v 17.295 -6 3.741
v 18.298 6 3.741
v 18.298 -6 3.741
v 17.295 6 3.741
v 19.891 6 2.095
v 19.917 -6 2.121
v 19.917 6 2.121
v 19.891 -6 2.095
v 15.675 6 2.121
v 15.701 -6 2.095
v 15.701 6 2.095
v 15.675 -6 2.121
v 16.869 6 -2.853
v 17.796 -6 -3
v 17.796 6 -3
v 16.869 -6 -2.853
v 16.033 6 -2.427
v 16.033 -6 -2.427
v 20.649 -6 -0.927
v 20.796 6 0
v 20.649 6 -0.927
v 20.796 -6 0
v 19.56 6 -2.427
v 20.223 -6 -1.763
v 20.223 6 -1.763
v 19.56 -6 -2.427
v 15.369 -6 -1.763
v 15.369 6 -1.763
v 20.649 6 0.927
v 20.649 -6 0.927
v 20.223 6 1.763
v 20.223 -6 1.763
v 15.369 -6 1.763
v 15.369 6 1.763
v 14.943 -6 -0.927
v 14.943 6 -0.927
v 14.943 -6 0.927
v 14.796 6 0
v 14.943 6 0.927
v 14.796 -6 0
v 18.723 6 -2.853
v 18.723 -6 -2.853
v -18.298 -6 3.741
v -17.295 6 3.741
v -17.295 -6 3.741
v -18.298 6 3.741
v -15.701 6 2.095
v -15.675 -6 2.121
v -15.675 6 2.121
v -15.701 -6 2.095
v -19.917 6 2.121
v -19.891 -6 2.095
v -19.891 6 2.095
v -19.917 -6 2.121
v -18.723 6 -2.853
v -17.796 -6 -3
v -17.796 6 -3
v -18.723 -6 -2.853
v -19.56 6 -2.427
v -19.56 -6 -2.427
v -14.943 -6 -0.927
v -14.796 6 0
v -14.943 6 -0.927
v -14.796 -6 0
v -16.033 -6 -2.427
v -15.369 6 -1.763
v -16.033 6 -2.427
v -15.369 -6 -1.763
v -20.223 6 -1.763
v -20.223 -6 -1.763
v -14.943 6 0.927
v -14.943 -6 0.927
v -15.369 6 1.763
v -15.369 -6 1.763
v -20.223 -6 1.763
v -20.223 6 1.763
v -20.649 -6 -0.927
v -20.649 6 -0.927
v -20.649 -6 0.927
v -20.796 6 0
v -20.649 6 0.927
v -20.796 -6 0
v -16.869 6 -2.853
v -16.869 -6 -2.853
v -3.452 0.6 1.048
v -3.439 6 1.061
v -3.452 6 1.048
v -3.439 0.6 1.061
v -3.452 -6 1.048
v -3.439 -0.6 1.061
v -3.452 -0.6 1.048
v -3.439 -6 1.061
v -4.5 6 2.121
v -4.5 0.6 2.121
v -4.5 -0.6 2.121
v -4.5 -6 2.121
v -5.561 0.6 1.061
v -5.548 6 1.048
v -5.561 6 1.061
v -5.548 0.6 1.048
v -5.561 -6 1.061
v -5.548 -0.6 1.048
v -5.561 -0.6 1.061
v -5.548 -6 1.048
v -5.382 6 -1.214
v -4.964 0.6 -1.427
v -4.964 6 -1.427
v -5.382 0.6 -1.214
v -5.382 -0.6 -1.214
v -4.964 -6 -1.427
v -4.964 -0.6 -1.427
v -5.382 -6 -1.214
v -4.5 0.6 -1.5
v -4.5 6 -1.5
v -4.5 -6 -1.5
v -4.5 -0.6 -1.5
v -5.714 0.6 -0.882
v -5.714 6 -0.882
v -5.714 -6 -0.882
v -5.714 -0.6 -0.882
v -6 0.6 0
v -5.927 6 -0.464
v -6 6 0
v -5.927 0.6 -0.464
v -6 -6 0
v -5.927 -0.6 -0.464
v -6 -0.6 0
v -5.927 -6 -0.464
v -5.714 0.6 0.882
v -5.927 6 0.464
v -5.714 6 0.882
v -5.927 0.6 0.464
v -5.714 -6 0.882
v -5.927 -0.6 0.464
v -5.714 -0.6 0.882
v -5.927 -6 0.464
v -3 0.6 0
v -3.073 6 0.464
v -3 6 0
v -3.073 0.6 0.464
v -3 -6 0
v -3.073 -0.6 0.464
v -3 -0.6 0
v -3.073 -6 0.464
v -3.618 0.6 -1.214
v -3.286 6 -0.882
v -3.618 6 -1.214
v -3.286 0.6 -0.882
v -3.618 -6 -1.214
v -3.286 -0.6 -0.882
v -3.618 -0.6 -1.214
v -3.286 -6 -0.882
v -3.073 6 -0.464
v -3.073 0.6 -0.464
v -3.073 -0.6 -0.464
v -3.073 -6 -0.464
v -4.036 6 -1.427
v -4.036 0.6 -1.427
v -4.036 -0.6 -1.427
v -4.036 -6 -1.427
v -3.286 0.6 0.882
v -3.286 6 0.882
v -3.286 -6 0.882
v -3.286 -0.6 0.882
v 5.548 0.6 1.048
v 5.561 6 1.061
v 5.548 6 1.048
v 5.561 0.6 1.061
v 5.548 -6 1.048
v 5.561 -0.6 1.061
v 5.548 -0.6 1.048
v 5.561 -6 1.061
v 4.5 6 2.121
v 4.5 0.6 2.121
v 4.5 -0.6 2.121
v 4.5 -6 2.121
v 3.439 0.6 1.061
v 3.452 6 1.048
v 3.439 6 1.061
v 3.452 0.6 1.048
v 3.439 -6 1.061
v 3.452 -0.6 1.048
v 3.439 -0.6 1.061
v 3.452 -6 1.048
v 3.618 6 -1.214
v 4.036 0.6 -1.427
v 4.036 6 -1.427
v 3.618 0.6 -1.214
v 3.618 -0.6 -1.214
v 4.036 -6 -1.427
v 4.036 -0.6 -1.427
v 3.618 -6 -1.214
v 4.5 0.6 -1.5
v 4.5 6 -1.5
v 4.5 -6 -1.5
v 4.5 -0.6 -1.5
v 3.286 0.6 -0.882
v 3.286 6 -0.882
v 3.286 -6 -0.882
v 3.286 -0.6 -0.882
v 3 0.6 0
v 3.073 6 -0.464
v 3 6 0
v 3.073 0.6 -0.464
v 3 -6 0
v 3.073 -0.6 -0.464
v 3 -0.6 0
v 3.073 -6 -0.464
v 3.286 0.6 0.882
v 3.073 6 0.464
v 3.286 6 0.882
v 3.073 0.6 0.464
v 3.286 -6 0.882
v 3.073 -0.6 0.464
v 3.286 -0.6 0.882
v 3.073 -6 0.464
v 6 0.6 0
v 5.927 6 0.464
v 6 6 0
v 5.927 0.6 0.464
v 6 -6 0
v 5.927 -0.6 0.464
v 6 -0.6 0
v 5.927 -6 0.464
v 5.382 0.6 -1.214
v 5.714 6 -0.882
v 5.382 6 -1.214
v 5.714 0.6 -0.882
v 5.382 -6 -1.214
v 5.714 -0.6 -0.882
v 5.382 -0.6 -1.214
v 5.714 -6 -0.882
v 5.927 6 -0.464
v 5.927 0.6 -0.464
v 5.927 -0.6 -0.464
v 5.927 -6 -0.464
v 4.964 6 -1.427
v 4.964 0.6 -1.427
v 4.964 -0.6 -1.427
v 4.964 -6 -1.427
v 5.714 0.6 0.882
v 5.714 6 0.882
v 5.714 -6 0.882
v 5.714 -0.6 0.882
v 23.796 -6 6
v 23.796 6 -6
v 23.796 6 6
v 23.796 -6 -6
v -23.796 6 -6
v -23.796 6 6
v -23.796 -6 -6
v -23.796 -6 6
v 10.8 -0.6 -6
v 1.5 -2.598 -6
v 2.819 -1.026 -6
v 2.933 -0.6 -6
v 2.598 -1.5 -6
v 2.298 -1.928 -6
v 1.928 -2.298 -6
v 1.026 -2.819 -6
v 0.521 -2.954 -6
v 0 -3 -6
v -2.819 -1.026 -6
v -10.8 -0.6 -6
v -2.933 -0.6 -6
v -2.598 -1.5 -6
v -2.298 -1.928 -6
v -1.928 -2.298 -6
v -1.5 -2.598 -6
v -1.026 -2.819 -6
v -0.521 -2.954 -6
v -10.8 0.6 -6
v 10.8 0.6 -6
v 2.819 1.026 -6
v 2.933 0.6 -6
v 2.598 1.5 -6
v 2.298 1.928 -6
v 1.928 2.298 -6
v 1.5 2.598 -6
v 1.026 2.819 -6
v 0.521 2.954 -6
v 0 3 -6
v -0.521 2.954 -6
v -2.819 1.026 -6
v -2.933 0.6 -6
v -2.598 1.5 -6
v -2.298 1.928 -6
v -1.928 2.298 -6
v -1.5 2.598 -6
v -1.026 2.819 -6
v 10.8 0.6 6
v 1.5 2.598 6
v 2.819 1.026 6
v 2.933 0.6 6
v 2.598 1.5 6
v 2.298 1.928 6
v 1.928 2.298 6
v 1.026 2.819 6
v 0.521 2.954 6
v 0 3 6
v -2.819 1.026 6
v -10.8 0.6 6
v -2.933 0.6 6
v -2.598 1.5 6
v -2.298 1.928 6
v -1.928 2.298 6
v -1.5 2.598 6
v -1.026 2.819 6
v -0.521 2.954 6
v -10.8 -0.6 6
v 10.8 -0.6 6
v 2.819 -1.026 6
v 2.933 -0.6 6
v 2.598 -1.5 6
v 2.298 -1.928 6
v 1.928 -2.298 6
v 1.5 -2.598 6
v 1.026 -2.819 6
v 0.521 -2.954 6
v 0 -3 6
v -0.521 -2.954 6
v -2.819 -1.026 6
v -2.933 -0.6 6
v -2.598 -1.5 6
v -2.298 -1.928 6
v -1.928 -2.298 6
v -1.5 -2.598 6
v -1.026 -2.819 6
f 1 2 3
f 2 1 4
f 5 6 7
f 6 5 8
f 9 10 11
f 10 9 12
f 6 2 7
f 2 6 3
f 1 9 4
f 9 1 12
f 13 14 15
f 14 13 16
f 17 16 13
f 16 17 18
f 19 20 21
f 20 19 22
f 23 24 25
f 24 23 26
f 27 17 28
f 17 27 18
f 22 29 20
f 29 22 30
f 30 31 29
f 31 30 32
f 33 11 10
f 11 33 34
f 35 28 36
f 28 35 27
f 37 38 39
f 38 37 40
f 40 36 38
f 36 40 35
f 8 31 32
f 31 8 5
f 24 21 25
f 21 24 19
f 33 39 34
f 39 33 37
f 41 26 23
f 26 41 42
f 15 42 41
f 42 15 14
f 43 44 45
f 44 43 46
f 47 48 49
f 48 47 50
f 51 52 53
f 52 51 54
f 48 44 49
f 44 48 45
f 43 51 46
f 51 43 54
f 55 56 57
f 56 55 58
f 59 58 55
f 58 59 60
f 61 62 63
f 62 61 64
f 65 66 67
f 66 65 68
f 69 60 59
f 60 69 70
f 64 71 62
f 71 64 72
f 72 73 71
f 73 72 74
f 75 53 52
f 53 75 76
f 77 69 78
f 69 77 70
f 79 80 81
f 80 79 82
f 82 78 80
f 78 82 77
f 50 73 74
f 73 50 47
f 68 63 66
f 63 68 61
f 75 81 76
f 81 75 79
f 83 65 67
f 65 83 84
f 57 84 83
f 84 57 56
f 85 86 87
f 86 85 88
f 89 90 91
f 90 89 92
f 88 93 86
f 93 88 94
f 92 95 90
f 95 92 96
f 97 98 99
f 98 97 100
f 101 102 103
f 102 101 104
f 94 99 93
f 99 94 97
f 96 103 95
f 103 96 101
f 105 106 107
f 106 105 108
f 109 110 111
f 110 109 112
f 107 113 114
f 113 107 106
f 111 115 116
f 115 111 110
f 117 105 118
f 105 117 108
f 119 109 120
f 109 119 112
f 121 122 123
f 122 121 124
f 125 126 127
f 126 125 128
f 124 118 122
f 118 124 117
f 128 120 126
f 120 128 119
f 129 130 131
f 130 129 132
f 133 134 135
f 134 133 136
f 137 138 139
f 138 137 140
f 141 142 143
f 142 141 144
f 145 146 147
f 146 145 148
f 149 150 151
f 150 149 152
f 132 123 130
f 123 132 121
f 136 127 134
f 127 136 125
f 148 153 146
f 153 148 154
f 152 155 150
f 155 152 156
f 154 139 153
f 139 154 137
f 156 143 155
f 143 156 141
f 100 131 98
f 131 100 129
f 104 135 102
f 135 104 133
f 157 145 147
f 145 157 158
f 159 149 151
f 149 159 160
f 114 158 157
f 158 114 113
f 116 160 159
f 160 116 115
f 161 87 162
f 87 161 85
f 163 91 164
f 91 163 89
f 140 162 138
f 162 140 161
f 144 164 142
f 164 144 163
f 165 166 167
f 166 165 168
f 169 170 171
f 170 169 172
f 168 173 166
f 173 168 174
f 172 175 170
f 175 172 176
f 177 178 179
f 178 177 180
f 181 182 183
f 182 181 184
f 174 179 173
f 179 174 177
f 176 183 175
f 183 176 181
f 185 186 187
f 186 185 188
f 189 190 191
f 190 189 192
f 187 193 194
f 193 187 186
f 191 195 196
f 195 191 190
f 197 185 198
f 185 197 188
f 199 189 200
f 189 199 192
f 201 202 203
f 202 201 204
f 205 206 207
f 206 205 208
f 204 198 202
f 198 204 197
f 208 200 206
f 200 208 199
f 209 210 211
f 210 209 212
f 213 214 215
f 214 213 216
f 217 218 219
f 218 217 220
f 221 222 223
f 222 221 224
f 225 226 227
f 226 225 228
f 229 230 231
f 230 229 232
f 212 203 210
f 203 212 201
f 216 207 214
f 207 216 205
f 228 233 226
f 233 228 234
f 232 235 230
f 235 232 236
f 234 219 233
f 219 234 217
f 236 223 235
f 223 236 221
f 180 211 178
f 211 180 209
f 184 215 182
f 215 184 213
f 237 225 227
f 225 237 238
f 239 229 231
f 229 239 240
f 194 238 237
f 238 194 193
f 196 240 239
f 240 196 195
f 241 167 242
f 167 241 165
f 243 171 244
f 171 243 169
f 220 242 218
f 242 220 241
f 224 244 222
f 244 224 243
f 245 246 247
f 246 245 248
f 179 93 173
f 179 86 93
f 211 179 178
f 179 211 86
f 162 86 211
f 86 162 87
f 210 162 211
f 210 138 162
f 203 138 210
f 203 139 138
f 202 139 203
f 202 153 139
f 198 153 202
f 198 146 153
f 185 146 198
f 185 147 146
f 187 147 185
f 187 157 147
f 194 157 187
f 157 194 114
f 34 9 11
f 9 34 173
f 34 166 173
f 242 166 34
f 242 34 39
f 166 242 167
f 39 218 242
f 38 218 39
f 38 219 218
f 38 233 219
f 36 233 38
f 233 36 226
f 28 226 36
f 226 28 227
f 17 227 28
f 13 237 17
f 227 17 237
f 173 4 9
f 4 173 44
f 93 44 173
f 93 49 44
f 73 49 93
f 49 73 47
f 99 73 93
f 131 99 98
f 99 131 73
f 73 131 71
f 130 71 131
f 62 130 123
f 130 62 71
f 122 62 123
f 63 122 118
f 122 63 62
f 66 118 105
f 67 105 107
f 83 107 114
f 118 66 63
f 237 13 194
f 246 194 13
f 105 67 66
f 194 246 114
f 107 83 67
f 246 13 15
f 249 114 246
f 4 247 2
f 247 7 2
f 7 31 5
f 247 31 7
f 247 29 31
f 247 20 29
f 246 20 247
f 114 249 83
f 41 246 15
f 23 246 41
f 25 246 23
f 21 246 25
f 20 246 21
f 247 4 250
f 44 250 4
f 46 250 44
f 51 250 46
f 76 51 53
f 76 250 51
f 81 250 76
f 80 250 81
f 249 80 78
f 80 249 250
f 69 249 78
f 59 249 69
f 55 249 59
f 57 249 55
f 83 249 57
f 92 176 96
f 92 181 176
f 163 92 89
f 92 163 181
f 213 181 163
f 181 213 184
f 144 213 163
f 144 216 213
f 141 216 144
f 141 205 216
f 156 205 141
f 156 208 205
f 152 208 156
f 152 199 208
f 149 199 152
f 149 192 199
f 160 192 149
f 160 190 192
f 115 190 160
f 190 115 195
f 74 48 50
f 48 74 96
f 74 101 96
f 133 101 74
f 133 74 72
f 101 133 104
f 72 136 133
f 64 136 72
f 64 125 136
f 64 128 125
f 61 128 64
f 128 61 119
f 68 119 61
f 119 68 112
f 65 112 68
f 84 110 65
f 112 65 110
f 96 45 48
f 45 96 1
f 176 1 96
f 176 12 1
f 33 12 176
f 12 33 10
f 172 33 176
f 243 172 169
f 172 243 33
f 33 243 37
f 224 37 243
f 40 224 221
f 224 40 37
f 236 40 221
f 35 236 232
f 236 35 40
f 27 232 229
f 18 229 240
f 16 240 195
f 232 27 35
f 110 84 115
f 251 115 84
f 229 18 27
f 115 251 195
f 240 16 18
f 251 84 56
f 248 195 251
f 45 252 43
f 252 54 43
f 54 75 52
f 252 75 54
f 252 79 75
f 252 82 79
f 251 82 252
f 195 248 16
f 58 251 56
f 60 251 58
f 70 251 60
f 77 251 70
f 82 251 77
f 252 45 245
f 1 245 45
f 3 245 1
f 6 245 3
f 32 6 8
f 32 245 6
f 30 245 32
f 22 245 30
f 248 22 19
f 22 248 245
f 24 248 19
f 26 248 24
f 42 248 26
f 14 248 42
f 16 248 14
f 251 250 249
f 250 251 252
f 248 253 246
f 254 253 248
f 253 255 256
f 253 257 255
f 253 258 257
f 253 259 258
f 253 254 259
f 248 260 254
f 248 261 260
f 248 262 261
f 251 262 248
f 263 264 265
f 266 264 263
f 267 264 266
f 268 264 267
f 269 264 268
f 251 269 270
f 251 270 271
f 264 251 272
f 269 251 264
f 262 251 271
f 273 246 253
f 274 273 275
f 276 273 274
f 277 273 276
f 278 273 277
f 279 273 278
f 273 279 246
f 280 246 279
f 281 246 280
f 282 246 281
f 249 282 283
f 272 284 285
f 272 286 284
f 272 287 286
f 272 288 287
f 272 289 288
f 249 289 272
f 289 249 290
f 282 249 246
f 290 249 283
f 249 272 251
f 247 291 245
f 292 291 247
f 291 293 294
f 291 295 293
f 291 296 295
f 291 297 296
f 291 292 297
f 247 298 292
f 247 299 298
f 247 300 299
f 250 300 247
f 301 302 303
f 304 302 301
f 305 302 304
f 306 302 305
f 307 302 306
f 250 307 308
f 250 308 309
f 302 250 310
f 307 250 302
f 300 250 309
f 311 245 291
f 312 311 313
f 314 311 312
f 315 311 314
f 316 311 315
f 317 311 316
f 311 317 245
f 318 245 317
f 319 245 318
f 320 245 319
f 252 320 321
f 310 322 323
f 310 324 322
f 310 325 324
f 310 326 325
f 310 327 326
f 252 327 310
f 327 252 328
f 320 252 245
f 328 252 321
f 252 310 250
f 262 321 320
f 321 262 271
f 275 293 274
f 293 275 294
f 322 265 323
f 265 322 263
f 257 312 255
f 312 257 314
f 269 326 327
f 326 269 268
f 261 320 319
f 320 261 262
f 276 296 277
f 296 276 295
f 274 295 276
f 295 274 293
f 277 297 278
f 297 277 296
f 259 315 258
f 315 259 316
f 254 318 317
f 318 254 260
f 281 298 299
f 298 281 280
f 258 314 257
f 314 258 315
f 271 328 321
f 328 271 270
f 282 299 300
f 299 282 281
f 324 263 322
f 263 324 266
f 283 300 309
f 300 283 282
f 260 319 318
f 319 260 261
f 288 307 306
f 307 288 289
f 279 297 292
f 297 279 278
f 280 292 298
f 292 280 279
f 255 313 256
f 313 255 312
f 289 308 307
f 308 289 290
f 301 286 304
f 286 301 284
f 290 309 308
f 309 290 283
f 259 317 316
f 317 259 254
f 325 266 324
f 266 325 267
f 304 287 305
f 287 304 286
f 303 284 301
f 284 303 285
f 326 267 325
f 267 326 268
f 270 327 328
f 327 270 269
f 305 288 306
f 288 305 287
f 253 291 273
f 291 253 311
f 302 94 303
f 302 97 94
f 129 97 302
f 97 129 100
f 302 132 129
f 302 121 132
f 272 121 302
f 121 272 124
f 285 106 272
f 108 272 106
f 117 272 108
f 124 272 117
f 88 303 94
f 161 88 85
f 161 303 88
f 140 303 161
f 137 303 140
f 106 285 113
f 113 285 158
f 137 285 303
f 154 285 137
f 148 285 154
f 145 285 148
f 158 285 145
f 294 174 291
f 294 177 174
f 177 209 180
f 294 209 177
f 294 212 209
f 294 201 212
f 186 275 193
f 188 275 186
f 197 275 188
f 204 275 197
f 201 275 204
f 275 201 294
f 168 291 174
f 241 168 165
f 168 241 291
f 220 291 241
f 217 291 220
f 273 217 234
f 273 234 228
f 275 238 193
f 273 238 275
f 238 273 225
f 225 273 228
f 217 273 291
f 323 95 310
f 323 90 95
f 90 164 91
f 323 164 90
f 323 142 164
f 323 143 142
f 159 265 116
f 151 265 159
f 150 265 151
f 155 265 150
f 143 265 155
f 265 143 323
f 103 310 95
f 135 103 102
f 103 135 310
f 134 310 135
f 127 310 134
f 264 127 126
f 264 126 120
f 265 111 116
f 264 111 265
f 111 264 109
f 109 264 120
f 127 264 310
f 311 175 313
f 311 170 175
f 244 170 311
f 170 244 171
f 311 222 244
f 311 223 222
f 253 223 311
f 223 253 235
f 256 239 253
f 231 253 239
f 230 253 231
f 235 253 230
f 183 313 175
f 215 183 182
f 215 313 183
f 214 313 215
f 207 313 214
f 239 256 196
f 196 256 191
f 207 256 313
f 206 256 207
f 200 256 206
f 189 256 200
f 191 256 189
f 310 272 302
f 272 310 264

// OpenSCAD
// file: library.scad
include <parameters.scad>;


// inner and outer product.  Why aren't these standard?!!!?

function ip(v1 = [0,0,0], v2 = [0,0,0]) = v1.x*v2.x + v1.y*v2.y + v1.z*v2.z;

function op(v1 = [0,0,0], v2 = [0,0,0]) = [v1.y*v2.z - v1.z*v2.y, v1.z*v2.x - v1.x*v2.z, v1.x*v2.y - v1.y*v2.x];


/*
  This gives either a NEMA 14 stepper motor or its mounting holes.

  If body is true, you get the motor.  If it is false you get the screw holes and central
  hole needed to mount the motor.  If counterbore is positive and you are generating the mounting holes
  then the screw holes will get fat to accomodate a cap-screw head counterbore mm away from the face 
  of the motor.  For no counterbores, set counterbore negative.

*/

module nema14(body = true, counterbore = -1)
{
	color([1,0.4,0.4,1])
	union()
	{
		if(body)
		{
			translate([0, 0, nema14_shaft_length/2 - nema14_shaft_projection - nema14_hub_depth])
				cylinder(r = nema14_shaft/2, h = nema14_shaft_length, center = true, $fn=20);
			translate([0, 0, -nema14_hub_depth])
				cylinder(r = nema14_hub/2, h = nema14_hub_depth*2, center = true, $fn=20);
	
			translate([0, 0, nema14_length/2])
				cube([nema14_square,nema14_square,nema14_length], center = true);
		} else
			translate([0, 0, -20])
				cylinder(r = nema14_hub/2 + 1, h = 50, center = true, $fn=20);

		if(!body)
		{
			union()
			{
				for ( x = [0:1] ) 
				for ( y = [0:1] )
				{
					translate([(x-0.5)*nema14_screws, (y-0.5)*nema14_screws, -20])
						cylinder(r = screwsize/2, h = 50, center = true, $fn=10);
					if(counterbore >= 0)
						translate([(x-0.5)*nema14_screws, (y-0.5)*nema14_screws, -25-counterbore])
							cylinder(r = screwsize, h = 50, center = true, $fn=10);
				}
			}
		}
	}


}


// Pentagon nut that matches a hexagon...

module pentanut(height=40)
{
	rotate([0,0,60])
	intersection()
	{
		translate([-nutsize,-nutsize*5,-20])
			cube([nutsize*10, nutsize*10,height]);
		rotate([0,0,60])
			translate([-nutsize,-nutsize*5,-20])
				cube([nutsize*10, nutsize*10,height]);
		rotate([0,0,120])
			translate([-nutsize,-nutsize*5,-20])
				cube([nutsize*10, nutsize*10,height]);
		rotate([0,0,180])
			translate([-nutsize,-nutsize*5,-20])
				cube([nutsize*10, nutsize*10,height]);
		rotate([0,0,240])
			translate([-nutsize,-nutsize*5,-20])
				cube([nutsize*10, nutsize*10,height]);
	}
}


// Make a RepRap teardrop with its axis along Z
// If truncated is true, chop the apex; if not, come to a point

// I stole this function from Erik...


module teardrop(r=1.5, h=20, truncateMM=0.5)
{
	union()
	{
		if(truncateMM > 0)
		{
			intersection()
			{
				translate([truncateMM,0,h/2]) 
					scale([1,1,h])
						cube([r*2.8275,r*2,1],center=true);
				scale([1,1,h]) 
						rotate([0,0,3*45])
							cube([r,r,1]);
			}
		} else
		{
			scale([1,1,h])
				rotate([0,0,3*45])
					cube([r,r,1]);
		}
		cylinder(r=r, h = h, $fn=20);
	}
}


// Make a ball-bearing holder cutout

module bearing_holder(radius = 6.5)
{
	union()
	{
		cylinder (h = radius*20, r = radius, center = true, $fn = 20);
		for(i=[0:2])
		{
			rotate([0,0,120*i])
				translate([radius+screwsize/2, 0, 0])
					union()
					{
						cylinder (h = radius*20, r = screwsize/2, center = true, $fn = 20);
						translate([-screwsize, 0, 0])
							cube([2*screwsize, screwsize, radius*20], center = true);
					}
		}
	}
}

// Make a cuboid with a 45 degree top for vertical slots etc

module cen_hat(size)
{
	translate([0, 0, size.x/sqrt(2)])
		union()
		{
			rotate([0, 45, 0])
				cube([size.x, size.y, 5*max(size.x, max(size.y, size.z))], center=true);
			rotate([0, -45, 0])
				cube([size.x, size.y, 5*max(size.x, max(size.y, size.z))], center=true);
		}
}

module hat_cube(size = [1,1,1], center = false)
{
	difference()
	{
		cube(size, center);
		if(center)
			translate([0, 0, size.z/2])
				cen_hat(size);
		else
			translate([size.x/2, size.y/2, size.z])
				cen_hat(size);
	}
}



module rod(length, threaded) if (threaded && renderrodthreads) {
	linear_extrude(height = length, center = true, convexity = 10, twist = -360 * length / rodpitch, $fn = fn)
		translate([rodsize * 0.1 / 2, 0, 0])
			circle(r = rodsize * 0.9 / 2, $fn = fn);
} else cylinder(h = length, r = rodsize / 2, center = true, $fn = fn);


module rodnut(position, washer) render() translate([0, 0, position]) {
	intersection() {
		scale([1, 1, 0.5]) sphere(r = 1.05 * rodsize, center = true);
		difference() {
			cylinder (h = rodnutsize, r = rodnutdiameter / 2, center = true, $fn = 6);
			rod(rodnutsize + 0.1);
		}
	}
	if (washer == 1 || washer == 4) rodwasher(((position > 0) ? -1 : 1) * (rodnutsize + rodwashersize) / 2);
	if (washer == 2 || washer == 4) rodwasher(((position > 0) ? 1 : -1) * (rodnutsize + rodwashersize) / 2);
}


module rodwasher(position) render() translate ([0, 0, position]) difference() {
	cylinder(r = rodwasherdiameter / 2, h = rodwashersize, center = true, $fn = fn);
	rod(rodwashersize + 0.1);
}


module screw(length, nutpos, washer, bearingpos = -1) union(){
	translate([0, 0, -length / 2]) if (renderscrewthreads) {
		linear_extrude(height = length, center = true, convexity = 10, twist = -360 * length / screwpitch, $fn = fn)
			translate([screwsize * 0.1 / 2, 0, 0])
				circle(r = screwsize * 0.9 / 2, $fn = fn);
	} else cylinder(h = length, r = screwsize / 2, center = true, $fn = fn);
	render() difference() {
		translate([0, 0, screwsize / 2]) cylinder(h = screwsize, r = screwsize, center = true, $fn = fn);
		translate([0, 0, screwsize]) cylinder(h = screwsize, r = screwsize / 2, center = true, $fn = 6);
	}
	if (washer > 0 && nutpos > 0) {
		washer(nutpos);
		nut(nutpos + washersize);
	} else if (nutpos > 0) nut(nutpos);
	if (bearingpos >= 0) bearing(bearingpos);
}


module bearing(position) render() translate([0, 0, -position - bearingwidth / 2]) union() {
	difference() {
		cylinder(h = bearingwidth, r = bearingsize / 2, center = true, $fn = fn);
		cylinder(h = bearingwidth * 2, r = bearingsize / 2 - 1, center = true, $fn = fn);
	}
	difference() {
		cylinder(h = bearingwidth - 0.5, r = bearingsize / 2 - 0.5, center = true, $fn = fn);
		cylinder(h = bearingwidth * 2, r = screwsize / 2 + 0.5, center = true, $fn = fn);
	}
	difference() {
		cylinder(h = bearingwidth, r = screwsize / 2 + 1, center = true, $fn = fn);
		cylinder(h = bearingwidth + 0.1, r = screwsize / 2, center = true, $fn = fn);
	}
}


module nut(position, washer) render() translate([0, 0, -position - nutsize / 2]) {
	intersection() {
		scale([1, 1, 0.5]) sphere(r = 1.05 * screwsize, center = true);
		difference() {
			cylinder (h = nutsize, r = nutdiameter / 2, center = true, $fn = 6);
			cylinder(r = screwsize / 2, h = nutsize + 0.1, center = true, $fn = fn);
		}
	}
	if (washer > 0) washer(0);
}


module washer(position) render() translate ([0, 0, -position - washersize / 2]) difference() {
	cylinder(r = washerdiameter / 2, h = washersize, center = true, $fn = fn);
	cylinder(r = screwsize / 2, h = washersize + 0.1, center = true, $fn = fn);
}


//rod(20);
//translate([rodsize * 2.5, 0, 0]) rod(20, true);
//translate([rodsize * 5, 0, 0]) screw(10, true);
//translate([rodsize * 7.5, 0, 0]) bearing();
//translate([rodsize * 10, 0, 0]) rodnut();
//translate([rodsize * 12.5, 0, 0]) rodwasher();
//translate([rodsize * 15, 0, 0]) nut();
//translate([rodsize * 17.5, 0, 0]) washer();

//hat_cube(size=[2,40,2], center=false);

//bearing_holder();

//teardrop();

//pentanut();

//nema14(body = true, counterbore = -1);
// file: parameters.scad
// Parameters file for RepRap Huxley

pi=3.14159265;

// The relative location in your file system where the .dxf files are
// DXFs are for quick development.  They should be replaced by parameterised CSG in dure course.

fileroot="DXF-files/";

rodsize = 6;	//threaded/smooth rod diameter in mm
xaxis = 182.5;	//width of base in mm
yaxis = 266.5;	//length of base in mm


screwsize = 3;	//bearing bore/screw diameter in mm
bearingsize = 10;	//outer diameter of bearings in mm
bearingwidth = 4;	//width of bearings in mm


rodpitch = rodsize / 6;
rodnutsize = 0.8 * rodsize;
rodnutdiameter = 1.9 * rodsize;
rodwashersize = 0.2 * rodsize;
rodwasherdiameter = 2 * rodsize;
screwpitch = screwsize / 6;
nutsize = 0.8 * screwsize;
nutdiameter = 1.9 * screwsize;
washersize = 0.2 * screwsize;
washerdiameter = 2 * screwsize;
partthick = 2 * rodsize;
vertexrodspace = 2 * rodsize;


c = [0.3, 0.3, 0.3];
rodendoffset = rodnutsize + rodwashersize * 2 + partthick / 2;
vertexoffset = vertexrodspace + rodendoffset;


renderrodthreads = false;
renderscrewthreads = false;
fn = 36;

// The gap between the joining rods at a vertex

vertex_radius=sqrt(rodsize*rodsize + vertexoffset*vertexoffset);
vertex_ang = atan(vertexoffset/rodsize)-30;
vertex_gap = 2*vertex_radius*cos(vertex_ang);

// Nema 14 dimensions - these are absolute

nema14_square=35.3;
nema14_screws=26;
nema14_hub=22;
nema14_hub_depth=2;
nema14_length=36;
nema14_shaft=5;
nema14_shaft_length=66;
nema14_shaft_projection=19;

// Limit switch parameters

limit_switch_hole_diameter=2.5;
limit_switch_centres=9.5;

// The RepRap slide bearings

bearing_mount_centres=18;
bearing_width=7;

// X axis parameters - many should be relative

x_bar_gap=30;
motor_center_y = 26;
bar_clamp_x=5;
bar_clamp_y=8;
bar_clamp_x_gap=23;
bearing_y=50;
bearing_x=bar_clamp_x_gap + 10;
hole_land=4;
thickness=5;
bearing_low_z = 8;
bearing_z_gap = 25;
bearing_plate_width = bearing_mount_centres+2*hole_land + 10;
bearing_plate_overlap=0.5;
bearing_plate_support=10;
// main file
include <parameters.scad>;
use <library.scad>;

module z_top_clamp()
{
	rotate([-90,0,0])
		difference()
		{
		
			cube([vertex_gap+partthick, partthick,partthick],center=true);
		
			translate([vertex_gap/2, 0, -partthick])
				rotate([0,0,90])
					teardrop(r=rodsize/2 , h=partthick*2,truncateMM=0.5);
			translate([-vertex_gap/2, 0, -partthick])
				rotate([0,0,90])
					teardrop(r=rodsize/2 , h=partthick*2,truncateMM=0.5);
		
			translate([-(rodsize+screwsize)/2, 0, -partthick])
				rotate([0,0,90])
					teardrop(r=screwsize/2 , h=partthick*2,truncateMM=-1);
		
			translate([(rodsize+screwsize)/2, 0, -partthick])
				rotate([0,0,90])
					teardrop(r=screwsize/2 , h=partthick*2,truncateMM=-1);
		
			rotate([90,0,0])
				rod(partthick*2);
			cube([1.8*partthick,2*partthick,partthick*0.1], center=true);
		}
}

z_top_clamp();
